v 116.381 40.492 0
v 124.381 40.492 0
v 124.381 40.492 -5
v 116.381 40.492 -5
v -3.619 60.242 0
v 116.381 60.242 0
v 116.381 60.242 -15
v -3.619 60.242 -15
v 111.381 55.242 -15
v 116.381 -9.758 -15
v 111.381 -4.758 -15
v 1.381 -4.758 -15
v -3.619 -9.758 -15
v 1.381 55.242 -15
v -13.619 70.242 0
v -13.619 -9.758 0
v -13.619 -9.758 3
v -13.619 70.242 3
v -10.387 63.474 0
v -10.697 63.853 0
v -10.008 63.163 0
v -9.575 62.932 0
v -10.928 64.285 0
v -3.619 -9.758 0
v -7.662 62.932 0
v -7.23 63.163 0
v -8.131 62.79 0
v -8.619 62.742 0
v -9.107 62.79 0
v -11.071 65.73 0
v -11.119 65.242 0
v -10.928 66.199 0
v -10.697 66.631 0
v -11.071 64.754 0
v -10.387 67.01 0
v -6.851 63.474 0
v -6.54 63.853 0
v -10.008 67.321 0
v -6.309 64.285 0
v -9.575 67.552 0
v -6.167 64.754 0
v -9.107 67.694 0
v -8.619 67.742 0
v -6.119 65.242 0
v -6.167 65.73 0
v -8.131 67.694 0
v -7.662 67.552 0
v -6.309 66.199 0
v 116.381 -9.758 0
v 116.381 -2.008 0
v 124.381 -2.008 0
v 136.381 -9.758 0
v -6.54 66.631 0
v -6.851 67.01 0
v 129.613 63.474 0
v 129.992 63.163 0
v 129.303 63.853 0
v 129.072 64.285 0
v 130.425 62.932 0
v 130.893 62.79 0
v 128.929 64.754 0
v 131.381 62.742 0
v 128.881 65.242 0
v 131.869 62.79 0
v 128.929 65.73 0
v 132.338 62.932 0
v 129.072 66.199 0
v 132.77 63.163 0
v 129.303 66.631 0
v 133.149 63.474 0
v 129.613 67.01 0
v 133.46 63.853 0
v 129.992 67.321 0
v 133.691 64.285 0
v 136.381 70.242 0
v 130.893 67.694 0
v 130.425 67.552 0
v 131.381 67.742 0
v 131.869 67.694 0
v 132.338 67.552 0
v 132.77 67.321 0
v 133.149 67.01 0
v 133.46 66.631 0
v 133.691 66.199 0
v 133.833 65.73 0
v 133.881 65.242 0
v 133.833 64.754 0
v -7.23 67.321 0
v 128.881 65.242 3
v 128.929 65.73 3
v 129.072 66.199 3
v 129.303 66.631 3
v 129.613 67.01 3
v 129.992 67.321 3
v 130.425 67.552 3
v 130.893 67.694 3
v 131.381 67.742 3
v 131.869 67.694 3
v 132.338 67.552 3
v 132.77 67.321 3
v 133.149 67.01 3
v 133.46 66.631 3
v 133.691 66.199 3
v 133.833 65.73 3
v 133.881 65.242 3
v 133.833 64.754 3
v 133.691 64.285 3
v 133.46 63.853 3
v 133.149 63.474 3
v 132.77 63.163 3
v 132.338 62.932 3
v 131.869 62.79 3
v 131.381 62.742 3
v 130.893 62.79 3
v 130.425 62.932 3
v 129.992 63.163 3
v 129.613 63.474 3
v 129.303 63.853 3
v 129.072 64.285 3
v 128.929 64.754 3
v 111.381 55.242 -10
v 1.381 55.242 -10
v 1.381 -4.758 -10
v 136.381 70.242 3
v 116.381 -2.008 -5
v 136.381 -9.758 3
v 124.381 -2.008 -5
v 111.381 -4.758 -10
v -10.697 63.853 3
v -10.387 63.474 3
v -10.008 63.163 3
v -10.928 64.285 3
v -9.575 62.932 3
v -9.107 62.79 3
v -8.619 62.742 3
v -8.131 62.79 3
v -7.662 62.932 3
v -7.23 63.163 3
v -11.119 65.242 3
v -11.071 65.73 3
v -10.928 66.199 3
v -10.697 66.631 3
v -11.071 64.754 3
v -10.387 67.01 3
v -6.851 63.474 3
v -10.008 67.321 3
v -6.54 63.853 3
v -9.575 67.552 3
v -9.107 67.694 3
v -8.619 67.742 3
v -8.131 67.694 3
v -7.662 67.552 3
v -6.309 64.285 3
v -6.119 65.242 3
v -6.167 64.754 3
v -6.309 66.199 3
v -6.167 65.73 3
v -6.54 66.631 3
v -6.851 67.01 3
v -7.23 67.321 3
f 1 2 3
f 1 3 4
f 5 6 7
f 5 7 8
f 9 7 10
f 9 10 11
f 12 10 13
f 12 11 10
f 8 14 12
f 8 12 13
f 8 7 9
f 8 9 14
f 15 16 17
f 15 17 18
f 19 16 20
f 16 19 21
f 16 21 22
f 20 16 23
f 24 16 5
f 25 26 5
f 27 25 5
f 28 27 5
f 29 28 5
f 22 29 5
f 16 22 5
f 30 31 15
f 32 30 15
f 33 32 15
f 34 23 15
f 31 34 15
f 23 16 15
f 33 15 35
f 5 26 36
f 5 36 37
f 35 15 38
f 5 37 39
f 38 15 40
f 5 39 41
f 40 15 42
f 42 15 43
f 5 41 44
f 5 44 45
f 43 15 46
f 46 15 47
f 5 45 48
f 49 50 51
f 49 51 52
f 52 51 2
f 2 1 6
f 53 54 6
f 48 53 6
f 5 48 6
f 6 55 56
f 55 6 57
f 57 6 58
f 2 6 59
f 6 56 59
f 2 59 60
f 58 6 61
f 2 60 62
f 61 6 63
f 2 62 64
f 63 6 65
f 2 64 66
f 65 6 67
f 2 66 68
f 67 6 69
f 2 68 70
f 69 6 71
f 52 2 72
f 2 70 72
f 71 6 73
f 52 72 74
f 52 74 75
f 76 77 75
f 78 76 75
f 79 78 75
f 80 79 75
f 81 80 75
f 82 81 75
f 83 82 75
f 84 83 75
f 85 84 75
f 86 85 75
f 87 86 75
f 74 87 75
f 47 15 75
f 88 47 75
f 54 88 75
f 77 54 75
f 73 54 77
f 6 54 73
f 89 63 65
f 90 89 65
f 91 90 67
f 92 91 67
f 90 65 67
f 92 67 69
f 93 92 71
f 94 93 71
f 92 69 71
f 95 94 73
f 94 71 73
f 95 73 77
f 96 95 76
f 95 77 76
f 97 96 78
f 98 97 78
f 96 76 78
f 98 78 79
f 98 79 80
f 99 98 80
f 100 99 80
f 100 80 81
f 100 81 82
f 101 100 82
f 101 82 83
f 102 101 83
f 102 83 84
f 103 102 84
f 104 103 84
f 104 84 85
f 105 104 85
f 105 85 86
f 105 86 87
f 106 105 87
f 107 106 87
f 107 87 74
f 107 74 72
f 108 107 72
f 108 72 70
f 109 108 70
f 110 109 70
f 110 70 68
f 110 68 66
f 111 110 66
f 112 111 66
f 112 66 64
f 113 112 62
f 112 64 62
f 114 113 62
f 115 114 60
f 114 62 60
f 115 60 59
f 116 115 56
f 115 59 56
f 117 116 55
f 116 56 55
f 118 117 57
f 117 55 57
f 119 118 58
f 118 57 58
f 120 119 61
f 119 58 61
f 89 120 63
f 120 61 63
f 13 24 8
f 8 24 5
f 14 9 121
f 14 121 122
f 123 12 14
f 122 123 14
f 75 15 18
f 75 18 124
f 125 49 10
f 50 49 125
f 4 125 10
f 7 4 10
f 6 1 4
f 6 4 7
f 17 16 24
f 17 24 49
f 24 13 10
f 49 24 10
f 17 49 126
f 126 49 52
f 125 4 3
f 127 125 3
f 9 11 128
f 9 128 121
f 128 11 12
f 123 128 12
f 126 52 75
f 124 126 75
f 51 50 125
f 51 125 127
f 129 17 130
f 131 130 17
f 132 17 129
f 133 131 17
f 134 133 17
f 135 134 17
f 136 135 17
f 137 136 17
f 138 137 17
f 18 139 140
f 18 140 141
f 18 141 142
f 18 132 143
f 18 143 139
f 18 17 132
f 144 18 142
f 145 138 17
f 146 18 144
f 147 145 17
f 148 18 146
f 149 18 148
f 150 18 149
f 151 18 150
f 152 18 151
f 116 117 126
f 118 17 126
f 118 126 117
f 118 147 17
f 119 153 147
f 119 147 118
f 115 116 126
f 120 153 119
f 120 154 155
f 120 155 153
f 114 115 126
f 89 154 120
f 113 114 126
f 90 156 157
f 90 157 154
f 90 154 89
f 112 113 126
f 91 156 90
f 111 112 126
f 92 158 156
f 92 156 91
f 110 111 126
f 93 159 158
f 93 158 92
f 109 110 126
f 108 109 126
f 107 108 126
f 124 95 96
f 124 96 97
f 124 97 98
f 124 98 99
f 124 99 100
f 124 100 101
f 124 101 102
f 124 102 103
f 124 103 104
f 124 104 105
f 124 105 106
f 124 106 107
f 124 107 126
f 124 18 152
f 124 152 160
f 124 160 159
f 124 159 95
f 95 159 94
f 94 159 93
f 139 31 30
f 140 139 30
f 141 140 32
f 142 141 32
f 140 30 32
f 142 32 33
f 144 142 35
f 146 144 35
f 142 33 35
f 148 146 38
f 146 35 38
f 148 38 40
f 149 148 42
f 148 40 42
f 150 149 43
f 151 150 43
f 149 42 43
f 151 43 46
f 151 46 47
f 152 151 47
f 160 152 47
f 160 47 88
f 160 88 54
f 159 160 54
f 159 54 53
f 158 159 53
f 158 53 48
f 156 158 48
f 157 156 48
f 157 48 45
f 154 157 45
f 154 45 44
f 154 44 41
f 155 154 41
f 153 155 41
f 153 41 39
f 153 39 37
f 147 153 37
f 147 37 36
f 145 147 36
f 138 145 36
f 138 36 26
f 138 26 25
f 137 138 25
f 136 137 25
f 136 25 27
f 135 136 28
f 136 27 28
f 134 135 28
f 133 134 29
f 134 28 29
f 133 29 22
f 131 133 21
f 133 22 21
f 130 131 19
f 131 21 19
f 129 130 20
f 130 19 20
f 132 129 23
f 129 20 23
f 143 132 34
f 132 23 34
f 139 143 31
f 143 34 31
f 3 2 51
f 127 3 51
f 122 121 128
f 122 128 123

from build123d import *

# Parameters (mm, degrees)
SKETCH1_W               = 150
SKETCH1_H               = 80
BOSS_EXTRUDE2_DEPTH     = 3
BOSS_EXTRUDE4_OUTLINE_W = 120
BOSS_EXTRUDE4_OUTLINE_H = 70
BOSS_EXTRUDE4_DEPTH     = 15
BOSS_EXTRUDE5_DEPTH     = 5
SKETCH6_W               = 110
SKETCH6_H               = 60
CUT_EXTRUDE1_DEPTH      = 5
SKETCH7_R               = 2.5
CUT_EXTRUDE2_DEPTH      = 5


# Read off the part's stored shape, not the designer's step: Boss-Extrude4
with BuildPart() as part:
    # Sketch1 → Boss-Extrude2 (new body)
    with BuildSketch(Plane.XY):
        with Locations((61.381224804, 30.24216319)):
            Rectangle(SKETCH1_W, SKETCH1_H)
    extrude(amount=BOSS_EXTRUDE2_DEPTH)

    # Boss-Extrude4 outline → Boss-Extrude4 (add)
    with BuildSketch(Plane(origin=(0, 0, 0), x_dir=(-1, 0, 0), z_dir=(0, 0, -1))):
        with Locations((-56.381224804, 25.24216319)):
            Rectangle(BOSS_EXTRUDE4_OUTLINE_W, BOSS_EXTRUDE4_OUTLINE_H)
    extrude(amount=BOSS_EXTRUDE4_DEPTH)

    # Sketch5 → Boss-Extrude5 (add)
    with BuildSketch(Plane(origin=(0, 0, 0), x_dir=(-1, 0, 0), z_dir=(0, 0, -1))):
        Polygon((-124.381224804, 19.24216319), (-124.381224804, 40.49216319), (-116.381224804, 40.49216319), (-116.381224804, -2.00783681), (-124.381224804, -2.00783681), align=None)
    extrude(amount=BOSS_EXTRUDE5_DEPTH)

    # Sketch6 → Cut-Extrude1 (cut)
    with BuildSketch(Plane(origin=(0, 0, -15), x_dir=(-1, 0, 0), z_dir=(0, 0, -1))):
        with Locations((-56.381224804, 25.24216319)):
            Rectangle(SKETCH6_W, SKETCH6_H)
    extrude(amount=-CUT_EXTRUDE1_DEPTH, mode=Mode.SUBTRACT)

    # Sketch7 → Cut-Extrude2 (cut)
    with BuildSketch(Plane(origin=(0, 0, 0), x_dir=(-1, 0, 0), z_dir=(0, 0, -1))):
        with Locations((-131.381224804, 65.24216319)):
            Circle(SKETCH7_R)
        with Locations((8.618775196, 65.24216319)):
            Circle(SKETCH7_R)
        with Locations((-131.381224804, -29.765126005)):
            Circle(SKETCH7_R)
        with Locations((8.618775196, -29.765126005)):
            Circle(SKETCH7_R)
    extrude(amount=-CUT_EXTRUDE2_DEPTH, mode=Mode.SUBTRACT)


solid = part.part
